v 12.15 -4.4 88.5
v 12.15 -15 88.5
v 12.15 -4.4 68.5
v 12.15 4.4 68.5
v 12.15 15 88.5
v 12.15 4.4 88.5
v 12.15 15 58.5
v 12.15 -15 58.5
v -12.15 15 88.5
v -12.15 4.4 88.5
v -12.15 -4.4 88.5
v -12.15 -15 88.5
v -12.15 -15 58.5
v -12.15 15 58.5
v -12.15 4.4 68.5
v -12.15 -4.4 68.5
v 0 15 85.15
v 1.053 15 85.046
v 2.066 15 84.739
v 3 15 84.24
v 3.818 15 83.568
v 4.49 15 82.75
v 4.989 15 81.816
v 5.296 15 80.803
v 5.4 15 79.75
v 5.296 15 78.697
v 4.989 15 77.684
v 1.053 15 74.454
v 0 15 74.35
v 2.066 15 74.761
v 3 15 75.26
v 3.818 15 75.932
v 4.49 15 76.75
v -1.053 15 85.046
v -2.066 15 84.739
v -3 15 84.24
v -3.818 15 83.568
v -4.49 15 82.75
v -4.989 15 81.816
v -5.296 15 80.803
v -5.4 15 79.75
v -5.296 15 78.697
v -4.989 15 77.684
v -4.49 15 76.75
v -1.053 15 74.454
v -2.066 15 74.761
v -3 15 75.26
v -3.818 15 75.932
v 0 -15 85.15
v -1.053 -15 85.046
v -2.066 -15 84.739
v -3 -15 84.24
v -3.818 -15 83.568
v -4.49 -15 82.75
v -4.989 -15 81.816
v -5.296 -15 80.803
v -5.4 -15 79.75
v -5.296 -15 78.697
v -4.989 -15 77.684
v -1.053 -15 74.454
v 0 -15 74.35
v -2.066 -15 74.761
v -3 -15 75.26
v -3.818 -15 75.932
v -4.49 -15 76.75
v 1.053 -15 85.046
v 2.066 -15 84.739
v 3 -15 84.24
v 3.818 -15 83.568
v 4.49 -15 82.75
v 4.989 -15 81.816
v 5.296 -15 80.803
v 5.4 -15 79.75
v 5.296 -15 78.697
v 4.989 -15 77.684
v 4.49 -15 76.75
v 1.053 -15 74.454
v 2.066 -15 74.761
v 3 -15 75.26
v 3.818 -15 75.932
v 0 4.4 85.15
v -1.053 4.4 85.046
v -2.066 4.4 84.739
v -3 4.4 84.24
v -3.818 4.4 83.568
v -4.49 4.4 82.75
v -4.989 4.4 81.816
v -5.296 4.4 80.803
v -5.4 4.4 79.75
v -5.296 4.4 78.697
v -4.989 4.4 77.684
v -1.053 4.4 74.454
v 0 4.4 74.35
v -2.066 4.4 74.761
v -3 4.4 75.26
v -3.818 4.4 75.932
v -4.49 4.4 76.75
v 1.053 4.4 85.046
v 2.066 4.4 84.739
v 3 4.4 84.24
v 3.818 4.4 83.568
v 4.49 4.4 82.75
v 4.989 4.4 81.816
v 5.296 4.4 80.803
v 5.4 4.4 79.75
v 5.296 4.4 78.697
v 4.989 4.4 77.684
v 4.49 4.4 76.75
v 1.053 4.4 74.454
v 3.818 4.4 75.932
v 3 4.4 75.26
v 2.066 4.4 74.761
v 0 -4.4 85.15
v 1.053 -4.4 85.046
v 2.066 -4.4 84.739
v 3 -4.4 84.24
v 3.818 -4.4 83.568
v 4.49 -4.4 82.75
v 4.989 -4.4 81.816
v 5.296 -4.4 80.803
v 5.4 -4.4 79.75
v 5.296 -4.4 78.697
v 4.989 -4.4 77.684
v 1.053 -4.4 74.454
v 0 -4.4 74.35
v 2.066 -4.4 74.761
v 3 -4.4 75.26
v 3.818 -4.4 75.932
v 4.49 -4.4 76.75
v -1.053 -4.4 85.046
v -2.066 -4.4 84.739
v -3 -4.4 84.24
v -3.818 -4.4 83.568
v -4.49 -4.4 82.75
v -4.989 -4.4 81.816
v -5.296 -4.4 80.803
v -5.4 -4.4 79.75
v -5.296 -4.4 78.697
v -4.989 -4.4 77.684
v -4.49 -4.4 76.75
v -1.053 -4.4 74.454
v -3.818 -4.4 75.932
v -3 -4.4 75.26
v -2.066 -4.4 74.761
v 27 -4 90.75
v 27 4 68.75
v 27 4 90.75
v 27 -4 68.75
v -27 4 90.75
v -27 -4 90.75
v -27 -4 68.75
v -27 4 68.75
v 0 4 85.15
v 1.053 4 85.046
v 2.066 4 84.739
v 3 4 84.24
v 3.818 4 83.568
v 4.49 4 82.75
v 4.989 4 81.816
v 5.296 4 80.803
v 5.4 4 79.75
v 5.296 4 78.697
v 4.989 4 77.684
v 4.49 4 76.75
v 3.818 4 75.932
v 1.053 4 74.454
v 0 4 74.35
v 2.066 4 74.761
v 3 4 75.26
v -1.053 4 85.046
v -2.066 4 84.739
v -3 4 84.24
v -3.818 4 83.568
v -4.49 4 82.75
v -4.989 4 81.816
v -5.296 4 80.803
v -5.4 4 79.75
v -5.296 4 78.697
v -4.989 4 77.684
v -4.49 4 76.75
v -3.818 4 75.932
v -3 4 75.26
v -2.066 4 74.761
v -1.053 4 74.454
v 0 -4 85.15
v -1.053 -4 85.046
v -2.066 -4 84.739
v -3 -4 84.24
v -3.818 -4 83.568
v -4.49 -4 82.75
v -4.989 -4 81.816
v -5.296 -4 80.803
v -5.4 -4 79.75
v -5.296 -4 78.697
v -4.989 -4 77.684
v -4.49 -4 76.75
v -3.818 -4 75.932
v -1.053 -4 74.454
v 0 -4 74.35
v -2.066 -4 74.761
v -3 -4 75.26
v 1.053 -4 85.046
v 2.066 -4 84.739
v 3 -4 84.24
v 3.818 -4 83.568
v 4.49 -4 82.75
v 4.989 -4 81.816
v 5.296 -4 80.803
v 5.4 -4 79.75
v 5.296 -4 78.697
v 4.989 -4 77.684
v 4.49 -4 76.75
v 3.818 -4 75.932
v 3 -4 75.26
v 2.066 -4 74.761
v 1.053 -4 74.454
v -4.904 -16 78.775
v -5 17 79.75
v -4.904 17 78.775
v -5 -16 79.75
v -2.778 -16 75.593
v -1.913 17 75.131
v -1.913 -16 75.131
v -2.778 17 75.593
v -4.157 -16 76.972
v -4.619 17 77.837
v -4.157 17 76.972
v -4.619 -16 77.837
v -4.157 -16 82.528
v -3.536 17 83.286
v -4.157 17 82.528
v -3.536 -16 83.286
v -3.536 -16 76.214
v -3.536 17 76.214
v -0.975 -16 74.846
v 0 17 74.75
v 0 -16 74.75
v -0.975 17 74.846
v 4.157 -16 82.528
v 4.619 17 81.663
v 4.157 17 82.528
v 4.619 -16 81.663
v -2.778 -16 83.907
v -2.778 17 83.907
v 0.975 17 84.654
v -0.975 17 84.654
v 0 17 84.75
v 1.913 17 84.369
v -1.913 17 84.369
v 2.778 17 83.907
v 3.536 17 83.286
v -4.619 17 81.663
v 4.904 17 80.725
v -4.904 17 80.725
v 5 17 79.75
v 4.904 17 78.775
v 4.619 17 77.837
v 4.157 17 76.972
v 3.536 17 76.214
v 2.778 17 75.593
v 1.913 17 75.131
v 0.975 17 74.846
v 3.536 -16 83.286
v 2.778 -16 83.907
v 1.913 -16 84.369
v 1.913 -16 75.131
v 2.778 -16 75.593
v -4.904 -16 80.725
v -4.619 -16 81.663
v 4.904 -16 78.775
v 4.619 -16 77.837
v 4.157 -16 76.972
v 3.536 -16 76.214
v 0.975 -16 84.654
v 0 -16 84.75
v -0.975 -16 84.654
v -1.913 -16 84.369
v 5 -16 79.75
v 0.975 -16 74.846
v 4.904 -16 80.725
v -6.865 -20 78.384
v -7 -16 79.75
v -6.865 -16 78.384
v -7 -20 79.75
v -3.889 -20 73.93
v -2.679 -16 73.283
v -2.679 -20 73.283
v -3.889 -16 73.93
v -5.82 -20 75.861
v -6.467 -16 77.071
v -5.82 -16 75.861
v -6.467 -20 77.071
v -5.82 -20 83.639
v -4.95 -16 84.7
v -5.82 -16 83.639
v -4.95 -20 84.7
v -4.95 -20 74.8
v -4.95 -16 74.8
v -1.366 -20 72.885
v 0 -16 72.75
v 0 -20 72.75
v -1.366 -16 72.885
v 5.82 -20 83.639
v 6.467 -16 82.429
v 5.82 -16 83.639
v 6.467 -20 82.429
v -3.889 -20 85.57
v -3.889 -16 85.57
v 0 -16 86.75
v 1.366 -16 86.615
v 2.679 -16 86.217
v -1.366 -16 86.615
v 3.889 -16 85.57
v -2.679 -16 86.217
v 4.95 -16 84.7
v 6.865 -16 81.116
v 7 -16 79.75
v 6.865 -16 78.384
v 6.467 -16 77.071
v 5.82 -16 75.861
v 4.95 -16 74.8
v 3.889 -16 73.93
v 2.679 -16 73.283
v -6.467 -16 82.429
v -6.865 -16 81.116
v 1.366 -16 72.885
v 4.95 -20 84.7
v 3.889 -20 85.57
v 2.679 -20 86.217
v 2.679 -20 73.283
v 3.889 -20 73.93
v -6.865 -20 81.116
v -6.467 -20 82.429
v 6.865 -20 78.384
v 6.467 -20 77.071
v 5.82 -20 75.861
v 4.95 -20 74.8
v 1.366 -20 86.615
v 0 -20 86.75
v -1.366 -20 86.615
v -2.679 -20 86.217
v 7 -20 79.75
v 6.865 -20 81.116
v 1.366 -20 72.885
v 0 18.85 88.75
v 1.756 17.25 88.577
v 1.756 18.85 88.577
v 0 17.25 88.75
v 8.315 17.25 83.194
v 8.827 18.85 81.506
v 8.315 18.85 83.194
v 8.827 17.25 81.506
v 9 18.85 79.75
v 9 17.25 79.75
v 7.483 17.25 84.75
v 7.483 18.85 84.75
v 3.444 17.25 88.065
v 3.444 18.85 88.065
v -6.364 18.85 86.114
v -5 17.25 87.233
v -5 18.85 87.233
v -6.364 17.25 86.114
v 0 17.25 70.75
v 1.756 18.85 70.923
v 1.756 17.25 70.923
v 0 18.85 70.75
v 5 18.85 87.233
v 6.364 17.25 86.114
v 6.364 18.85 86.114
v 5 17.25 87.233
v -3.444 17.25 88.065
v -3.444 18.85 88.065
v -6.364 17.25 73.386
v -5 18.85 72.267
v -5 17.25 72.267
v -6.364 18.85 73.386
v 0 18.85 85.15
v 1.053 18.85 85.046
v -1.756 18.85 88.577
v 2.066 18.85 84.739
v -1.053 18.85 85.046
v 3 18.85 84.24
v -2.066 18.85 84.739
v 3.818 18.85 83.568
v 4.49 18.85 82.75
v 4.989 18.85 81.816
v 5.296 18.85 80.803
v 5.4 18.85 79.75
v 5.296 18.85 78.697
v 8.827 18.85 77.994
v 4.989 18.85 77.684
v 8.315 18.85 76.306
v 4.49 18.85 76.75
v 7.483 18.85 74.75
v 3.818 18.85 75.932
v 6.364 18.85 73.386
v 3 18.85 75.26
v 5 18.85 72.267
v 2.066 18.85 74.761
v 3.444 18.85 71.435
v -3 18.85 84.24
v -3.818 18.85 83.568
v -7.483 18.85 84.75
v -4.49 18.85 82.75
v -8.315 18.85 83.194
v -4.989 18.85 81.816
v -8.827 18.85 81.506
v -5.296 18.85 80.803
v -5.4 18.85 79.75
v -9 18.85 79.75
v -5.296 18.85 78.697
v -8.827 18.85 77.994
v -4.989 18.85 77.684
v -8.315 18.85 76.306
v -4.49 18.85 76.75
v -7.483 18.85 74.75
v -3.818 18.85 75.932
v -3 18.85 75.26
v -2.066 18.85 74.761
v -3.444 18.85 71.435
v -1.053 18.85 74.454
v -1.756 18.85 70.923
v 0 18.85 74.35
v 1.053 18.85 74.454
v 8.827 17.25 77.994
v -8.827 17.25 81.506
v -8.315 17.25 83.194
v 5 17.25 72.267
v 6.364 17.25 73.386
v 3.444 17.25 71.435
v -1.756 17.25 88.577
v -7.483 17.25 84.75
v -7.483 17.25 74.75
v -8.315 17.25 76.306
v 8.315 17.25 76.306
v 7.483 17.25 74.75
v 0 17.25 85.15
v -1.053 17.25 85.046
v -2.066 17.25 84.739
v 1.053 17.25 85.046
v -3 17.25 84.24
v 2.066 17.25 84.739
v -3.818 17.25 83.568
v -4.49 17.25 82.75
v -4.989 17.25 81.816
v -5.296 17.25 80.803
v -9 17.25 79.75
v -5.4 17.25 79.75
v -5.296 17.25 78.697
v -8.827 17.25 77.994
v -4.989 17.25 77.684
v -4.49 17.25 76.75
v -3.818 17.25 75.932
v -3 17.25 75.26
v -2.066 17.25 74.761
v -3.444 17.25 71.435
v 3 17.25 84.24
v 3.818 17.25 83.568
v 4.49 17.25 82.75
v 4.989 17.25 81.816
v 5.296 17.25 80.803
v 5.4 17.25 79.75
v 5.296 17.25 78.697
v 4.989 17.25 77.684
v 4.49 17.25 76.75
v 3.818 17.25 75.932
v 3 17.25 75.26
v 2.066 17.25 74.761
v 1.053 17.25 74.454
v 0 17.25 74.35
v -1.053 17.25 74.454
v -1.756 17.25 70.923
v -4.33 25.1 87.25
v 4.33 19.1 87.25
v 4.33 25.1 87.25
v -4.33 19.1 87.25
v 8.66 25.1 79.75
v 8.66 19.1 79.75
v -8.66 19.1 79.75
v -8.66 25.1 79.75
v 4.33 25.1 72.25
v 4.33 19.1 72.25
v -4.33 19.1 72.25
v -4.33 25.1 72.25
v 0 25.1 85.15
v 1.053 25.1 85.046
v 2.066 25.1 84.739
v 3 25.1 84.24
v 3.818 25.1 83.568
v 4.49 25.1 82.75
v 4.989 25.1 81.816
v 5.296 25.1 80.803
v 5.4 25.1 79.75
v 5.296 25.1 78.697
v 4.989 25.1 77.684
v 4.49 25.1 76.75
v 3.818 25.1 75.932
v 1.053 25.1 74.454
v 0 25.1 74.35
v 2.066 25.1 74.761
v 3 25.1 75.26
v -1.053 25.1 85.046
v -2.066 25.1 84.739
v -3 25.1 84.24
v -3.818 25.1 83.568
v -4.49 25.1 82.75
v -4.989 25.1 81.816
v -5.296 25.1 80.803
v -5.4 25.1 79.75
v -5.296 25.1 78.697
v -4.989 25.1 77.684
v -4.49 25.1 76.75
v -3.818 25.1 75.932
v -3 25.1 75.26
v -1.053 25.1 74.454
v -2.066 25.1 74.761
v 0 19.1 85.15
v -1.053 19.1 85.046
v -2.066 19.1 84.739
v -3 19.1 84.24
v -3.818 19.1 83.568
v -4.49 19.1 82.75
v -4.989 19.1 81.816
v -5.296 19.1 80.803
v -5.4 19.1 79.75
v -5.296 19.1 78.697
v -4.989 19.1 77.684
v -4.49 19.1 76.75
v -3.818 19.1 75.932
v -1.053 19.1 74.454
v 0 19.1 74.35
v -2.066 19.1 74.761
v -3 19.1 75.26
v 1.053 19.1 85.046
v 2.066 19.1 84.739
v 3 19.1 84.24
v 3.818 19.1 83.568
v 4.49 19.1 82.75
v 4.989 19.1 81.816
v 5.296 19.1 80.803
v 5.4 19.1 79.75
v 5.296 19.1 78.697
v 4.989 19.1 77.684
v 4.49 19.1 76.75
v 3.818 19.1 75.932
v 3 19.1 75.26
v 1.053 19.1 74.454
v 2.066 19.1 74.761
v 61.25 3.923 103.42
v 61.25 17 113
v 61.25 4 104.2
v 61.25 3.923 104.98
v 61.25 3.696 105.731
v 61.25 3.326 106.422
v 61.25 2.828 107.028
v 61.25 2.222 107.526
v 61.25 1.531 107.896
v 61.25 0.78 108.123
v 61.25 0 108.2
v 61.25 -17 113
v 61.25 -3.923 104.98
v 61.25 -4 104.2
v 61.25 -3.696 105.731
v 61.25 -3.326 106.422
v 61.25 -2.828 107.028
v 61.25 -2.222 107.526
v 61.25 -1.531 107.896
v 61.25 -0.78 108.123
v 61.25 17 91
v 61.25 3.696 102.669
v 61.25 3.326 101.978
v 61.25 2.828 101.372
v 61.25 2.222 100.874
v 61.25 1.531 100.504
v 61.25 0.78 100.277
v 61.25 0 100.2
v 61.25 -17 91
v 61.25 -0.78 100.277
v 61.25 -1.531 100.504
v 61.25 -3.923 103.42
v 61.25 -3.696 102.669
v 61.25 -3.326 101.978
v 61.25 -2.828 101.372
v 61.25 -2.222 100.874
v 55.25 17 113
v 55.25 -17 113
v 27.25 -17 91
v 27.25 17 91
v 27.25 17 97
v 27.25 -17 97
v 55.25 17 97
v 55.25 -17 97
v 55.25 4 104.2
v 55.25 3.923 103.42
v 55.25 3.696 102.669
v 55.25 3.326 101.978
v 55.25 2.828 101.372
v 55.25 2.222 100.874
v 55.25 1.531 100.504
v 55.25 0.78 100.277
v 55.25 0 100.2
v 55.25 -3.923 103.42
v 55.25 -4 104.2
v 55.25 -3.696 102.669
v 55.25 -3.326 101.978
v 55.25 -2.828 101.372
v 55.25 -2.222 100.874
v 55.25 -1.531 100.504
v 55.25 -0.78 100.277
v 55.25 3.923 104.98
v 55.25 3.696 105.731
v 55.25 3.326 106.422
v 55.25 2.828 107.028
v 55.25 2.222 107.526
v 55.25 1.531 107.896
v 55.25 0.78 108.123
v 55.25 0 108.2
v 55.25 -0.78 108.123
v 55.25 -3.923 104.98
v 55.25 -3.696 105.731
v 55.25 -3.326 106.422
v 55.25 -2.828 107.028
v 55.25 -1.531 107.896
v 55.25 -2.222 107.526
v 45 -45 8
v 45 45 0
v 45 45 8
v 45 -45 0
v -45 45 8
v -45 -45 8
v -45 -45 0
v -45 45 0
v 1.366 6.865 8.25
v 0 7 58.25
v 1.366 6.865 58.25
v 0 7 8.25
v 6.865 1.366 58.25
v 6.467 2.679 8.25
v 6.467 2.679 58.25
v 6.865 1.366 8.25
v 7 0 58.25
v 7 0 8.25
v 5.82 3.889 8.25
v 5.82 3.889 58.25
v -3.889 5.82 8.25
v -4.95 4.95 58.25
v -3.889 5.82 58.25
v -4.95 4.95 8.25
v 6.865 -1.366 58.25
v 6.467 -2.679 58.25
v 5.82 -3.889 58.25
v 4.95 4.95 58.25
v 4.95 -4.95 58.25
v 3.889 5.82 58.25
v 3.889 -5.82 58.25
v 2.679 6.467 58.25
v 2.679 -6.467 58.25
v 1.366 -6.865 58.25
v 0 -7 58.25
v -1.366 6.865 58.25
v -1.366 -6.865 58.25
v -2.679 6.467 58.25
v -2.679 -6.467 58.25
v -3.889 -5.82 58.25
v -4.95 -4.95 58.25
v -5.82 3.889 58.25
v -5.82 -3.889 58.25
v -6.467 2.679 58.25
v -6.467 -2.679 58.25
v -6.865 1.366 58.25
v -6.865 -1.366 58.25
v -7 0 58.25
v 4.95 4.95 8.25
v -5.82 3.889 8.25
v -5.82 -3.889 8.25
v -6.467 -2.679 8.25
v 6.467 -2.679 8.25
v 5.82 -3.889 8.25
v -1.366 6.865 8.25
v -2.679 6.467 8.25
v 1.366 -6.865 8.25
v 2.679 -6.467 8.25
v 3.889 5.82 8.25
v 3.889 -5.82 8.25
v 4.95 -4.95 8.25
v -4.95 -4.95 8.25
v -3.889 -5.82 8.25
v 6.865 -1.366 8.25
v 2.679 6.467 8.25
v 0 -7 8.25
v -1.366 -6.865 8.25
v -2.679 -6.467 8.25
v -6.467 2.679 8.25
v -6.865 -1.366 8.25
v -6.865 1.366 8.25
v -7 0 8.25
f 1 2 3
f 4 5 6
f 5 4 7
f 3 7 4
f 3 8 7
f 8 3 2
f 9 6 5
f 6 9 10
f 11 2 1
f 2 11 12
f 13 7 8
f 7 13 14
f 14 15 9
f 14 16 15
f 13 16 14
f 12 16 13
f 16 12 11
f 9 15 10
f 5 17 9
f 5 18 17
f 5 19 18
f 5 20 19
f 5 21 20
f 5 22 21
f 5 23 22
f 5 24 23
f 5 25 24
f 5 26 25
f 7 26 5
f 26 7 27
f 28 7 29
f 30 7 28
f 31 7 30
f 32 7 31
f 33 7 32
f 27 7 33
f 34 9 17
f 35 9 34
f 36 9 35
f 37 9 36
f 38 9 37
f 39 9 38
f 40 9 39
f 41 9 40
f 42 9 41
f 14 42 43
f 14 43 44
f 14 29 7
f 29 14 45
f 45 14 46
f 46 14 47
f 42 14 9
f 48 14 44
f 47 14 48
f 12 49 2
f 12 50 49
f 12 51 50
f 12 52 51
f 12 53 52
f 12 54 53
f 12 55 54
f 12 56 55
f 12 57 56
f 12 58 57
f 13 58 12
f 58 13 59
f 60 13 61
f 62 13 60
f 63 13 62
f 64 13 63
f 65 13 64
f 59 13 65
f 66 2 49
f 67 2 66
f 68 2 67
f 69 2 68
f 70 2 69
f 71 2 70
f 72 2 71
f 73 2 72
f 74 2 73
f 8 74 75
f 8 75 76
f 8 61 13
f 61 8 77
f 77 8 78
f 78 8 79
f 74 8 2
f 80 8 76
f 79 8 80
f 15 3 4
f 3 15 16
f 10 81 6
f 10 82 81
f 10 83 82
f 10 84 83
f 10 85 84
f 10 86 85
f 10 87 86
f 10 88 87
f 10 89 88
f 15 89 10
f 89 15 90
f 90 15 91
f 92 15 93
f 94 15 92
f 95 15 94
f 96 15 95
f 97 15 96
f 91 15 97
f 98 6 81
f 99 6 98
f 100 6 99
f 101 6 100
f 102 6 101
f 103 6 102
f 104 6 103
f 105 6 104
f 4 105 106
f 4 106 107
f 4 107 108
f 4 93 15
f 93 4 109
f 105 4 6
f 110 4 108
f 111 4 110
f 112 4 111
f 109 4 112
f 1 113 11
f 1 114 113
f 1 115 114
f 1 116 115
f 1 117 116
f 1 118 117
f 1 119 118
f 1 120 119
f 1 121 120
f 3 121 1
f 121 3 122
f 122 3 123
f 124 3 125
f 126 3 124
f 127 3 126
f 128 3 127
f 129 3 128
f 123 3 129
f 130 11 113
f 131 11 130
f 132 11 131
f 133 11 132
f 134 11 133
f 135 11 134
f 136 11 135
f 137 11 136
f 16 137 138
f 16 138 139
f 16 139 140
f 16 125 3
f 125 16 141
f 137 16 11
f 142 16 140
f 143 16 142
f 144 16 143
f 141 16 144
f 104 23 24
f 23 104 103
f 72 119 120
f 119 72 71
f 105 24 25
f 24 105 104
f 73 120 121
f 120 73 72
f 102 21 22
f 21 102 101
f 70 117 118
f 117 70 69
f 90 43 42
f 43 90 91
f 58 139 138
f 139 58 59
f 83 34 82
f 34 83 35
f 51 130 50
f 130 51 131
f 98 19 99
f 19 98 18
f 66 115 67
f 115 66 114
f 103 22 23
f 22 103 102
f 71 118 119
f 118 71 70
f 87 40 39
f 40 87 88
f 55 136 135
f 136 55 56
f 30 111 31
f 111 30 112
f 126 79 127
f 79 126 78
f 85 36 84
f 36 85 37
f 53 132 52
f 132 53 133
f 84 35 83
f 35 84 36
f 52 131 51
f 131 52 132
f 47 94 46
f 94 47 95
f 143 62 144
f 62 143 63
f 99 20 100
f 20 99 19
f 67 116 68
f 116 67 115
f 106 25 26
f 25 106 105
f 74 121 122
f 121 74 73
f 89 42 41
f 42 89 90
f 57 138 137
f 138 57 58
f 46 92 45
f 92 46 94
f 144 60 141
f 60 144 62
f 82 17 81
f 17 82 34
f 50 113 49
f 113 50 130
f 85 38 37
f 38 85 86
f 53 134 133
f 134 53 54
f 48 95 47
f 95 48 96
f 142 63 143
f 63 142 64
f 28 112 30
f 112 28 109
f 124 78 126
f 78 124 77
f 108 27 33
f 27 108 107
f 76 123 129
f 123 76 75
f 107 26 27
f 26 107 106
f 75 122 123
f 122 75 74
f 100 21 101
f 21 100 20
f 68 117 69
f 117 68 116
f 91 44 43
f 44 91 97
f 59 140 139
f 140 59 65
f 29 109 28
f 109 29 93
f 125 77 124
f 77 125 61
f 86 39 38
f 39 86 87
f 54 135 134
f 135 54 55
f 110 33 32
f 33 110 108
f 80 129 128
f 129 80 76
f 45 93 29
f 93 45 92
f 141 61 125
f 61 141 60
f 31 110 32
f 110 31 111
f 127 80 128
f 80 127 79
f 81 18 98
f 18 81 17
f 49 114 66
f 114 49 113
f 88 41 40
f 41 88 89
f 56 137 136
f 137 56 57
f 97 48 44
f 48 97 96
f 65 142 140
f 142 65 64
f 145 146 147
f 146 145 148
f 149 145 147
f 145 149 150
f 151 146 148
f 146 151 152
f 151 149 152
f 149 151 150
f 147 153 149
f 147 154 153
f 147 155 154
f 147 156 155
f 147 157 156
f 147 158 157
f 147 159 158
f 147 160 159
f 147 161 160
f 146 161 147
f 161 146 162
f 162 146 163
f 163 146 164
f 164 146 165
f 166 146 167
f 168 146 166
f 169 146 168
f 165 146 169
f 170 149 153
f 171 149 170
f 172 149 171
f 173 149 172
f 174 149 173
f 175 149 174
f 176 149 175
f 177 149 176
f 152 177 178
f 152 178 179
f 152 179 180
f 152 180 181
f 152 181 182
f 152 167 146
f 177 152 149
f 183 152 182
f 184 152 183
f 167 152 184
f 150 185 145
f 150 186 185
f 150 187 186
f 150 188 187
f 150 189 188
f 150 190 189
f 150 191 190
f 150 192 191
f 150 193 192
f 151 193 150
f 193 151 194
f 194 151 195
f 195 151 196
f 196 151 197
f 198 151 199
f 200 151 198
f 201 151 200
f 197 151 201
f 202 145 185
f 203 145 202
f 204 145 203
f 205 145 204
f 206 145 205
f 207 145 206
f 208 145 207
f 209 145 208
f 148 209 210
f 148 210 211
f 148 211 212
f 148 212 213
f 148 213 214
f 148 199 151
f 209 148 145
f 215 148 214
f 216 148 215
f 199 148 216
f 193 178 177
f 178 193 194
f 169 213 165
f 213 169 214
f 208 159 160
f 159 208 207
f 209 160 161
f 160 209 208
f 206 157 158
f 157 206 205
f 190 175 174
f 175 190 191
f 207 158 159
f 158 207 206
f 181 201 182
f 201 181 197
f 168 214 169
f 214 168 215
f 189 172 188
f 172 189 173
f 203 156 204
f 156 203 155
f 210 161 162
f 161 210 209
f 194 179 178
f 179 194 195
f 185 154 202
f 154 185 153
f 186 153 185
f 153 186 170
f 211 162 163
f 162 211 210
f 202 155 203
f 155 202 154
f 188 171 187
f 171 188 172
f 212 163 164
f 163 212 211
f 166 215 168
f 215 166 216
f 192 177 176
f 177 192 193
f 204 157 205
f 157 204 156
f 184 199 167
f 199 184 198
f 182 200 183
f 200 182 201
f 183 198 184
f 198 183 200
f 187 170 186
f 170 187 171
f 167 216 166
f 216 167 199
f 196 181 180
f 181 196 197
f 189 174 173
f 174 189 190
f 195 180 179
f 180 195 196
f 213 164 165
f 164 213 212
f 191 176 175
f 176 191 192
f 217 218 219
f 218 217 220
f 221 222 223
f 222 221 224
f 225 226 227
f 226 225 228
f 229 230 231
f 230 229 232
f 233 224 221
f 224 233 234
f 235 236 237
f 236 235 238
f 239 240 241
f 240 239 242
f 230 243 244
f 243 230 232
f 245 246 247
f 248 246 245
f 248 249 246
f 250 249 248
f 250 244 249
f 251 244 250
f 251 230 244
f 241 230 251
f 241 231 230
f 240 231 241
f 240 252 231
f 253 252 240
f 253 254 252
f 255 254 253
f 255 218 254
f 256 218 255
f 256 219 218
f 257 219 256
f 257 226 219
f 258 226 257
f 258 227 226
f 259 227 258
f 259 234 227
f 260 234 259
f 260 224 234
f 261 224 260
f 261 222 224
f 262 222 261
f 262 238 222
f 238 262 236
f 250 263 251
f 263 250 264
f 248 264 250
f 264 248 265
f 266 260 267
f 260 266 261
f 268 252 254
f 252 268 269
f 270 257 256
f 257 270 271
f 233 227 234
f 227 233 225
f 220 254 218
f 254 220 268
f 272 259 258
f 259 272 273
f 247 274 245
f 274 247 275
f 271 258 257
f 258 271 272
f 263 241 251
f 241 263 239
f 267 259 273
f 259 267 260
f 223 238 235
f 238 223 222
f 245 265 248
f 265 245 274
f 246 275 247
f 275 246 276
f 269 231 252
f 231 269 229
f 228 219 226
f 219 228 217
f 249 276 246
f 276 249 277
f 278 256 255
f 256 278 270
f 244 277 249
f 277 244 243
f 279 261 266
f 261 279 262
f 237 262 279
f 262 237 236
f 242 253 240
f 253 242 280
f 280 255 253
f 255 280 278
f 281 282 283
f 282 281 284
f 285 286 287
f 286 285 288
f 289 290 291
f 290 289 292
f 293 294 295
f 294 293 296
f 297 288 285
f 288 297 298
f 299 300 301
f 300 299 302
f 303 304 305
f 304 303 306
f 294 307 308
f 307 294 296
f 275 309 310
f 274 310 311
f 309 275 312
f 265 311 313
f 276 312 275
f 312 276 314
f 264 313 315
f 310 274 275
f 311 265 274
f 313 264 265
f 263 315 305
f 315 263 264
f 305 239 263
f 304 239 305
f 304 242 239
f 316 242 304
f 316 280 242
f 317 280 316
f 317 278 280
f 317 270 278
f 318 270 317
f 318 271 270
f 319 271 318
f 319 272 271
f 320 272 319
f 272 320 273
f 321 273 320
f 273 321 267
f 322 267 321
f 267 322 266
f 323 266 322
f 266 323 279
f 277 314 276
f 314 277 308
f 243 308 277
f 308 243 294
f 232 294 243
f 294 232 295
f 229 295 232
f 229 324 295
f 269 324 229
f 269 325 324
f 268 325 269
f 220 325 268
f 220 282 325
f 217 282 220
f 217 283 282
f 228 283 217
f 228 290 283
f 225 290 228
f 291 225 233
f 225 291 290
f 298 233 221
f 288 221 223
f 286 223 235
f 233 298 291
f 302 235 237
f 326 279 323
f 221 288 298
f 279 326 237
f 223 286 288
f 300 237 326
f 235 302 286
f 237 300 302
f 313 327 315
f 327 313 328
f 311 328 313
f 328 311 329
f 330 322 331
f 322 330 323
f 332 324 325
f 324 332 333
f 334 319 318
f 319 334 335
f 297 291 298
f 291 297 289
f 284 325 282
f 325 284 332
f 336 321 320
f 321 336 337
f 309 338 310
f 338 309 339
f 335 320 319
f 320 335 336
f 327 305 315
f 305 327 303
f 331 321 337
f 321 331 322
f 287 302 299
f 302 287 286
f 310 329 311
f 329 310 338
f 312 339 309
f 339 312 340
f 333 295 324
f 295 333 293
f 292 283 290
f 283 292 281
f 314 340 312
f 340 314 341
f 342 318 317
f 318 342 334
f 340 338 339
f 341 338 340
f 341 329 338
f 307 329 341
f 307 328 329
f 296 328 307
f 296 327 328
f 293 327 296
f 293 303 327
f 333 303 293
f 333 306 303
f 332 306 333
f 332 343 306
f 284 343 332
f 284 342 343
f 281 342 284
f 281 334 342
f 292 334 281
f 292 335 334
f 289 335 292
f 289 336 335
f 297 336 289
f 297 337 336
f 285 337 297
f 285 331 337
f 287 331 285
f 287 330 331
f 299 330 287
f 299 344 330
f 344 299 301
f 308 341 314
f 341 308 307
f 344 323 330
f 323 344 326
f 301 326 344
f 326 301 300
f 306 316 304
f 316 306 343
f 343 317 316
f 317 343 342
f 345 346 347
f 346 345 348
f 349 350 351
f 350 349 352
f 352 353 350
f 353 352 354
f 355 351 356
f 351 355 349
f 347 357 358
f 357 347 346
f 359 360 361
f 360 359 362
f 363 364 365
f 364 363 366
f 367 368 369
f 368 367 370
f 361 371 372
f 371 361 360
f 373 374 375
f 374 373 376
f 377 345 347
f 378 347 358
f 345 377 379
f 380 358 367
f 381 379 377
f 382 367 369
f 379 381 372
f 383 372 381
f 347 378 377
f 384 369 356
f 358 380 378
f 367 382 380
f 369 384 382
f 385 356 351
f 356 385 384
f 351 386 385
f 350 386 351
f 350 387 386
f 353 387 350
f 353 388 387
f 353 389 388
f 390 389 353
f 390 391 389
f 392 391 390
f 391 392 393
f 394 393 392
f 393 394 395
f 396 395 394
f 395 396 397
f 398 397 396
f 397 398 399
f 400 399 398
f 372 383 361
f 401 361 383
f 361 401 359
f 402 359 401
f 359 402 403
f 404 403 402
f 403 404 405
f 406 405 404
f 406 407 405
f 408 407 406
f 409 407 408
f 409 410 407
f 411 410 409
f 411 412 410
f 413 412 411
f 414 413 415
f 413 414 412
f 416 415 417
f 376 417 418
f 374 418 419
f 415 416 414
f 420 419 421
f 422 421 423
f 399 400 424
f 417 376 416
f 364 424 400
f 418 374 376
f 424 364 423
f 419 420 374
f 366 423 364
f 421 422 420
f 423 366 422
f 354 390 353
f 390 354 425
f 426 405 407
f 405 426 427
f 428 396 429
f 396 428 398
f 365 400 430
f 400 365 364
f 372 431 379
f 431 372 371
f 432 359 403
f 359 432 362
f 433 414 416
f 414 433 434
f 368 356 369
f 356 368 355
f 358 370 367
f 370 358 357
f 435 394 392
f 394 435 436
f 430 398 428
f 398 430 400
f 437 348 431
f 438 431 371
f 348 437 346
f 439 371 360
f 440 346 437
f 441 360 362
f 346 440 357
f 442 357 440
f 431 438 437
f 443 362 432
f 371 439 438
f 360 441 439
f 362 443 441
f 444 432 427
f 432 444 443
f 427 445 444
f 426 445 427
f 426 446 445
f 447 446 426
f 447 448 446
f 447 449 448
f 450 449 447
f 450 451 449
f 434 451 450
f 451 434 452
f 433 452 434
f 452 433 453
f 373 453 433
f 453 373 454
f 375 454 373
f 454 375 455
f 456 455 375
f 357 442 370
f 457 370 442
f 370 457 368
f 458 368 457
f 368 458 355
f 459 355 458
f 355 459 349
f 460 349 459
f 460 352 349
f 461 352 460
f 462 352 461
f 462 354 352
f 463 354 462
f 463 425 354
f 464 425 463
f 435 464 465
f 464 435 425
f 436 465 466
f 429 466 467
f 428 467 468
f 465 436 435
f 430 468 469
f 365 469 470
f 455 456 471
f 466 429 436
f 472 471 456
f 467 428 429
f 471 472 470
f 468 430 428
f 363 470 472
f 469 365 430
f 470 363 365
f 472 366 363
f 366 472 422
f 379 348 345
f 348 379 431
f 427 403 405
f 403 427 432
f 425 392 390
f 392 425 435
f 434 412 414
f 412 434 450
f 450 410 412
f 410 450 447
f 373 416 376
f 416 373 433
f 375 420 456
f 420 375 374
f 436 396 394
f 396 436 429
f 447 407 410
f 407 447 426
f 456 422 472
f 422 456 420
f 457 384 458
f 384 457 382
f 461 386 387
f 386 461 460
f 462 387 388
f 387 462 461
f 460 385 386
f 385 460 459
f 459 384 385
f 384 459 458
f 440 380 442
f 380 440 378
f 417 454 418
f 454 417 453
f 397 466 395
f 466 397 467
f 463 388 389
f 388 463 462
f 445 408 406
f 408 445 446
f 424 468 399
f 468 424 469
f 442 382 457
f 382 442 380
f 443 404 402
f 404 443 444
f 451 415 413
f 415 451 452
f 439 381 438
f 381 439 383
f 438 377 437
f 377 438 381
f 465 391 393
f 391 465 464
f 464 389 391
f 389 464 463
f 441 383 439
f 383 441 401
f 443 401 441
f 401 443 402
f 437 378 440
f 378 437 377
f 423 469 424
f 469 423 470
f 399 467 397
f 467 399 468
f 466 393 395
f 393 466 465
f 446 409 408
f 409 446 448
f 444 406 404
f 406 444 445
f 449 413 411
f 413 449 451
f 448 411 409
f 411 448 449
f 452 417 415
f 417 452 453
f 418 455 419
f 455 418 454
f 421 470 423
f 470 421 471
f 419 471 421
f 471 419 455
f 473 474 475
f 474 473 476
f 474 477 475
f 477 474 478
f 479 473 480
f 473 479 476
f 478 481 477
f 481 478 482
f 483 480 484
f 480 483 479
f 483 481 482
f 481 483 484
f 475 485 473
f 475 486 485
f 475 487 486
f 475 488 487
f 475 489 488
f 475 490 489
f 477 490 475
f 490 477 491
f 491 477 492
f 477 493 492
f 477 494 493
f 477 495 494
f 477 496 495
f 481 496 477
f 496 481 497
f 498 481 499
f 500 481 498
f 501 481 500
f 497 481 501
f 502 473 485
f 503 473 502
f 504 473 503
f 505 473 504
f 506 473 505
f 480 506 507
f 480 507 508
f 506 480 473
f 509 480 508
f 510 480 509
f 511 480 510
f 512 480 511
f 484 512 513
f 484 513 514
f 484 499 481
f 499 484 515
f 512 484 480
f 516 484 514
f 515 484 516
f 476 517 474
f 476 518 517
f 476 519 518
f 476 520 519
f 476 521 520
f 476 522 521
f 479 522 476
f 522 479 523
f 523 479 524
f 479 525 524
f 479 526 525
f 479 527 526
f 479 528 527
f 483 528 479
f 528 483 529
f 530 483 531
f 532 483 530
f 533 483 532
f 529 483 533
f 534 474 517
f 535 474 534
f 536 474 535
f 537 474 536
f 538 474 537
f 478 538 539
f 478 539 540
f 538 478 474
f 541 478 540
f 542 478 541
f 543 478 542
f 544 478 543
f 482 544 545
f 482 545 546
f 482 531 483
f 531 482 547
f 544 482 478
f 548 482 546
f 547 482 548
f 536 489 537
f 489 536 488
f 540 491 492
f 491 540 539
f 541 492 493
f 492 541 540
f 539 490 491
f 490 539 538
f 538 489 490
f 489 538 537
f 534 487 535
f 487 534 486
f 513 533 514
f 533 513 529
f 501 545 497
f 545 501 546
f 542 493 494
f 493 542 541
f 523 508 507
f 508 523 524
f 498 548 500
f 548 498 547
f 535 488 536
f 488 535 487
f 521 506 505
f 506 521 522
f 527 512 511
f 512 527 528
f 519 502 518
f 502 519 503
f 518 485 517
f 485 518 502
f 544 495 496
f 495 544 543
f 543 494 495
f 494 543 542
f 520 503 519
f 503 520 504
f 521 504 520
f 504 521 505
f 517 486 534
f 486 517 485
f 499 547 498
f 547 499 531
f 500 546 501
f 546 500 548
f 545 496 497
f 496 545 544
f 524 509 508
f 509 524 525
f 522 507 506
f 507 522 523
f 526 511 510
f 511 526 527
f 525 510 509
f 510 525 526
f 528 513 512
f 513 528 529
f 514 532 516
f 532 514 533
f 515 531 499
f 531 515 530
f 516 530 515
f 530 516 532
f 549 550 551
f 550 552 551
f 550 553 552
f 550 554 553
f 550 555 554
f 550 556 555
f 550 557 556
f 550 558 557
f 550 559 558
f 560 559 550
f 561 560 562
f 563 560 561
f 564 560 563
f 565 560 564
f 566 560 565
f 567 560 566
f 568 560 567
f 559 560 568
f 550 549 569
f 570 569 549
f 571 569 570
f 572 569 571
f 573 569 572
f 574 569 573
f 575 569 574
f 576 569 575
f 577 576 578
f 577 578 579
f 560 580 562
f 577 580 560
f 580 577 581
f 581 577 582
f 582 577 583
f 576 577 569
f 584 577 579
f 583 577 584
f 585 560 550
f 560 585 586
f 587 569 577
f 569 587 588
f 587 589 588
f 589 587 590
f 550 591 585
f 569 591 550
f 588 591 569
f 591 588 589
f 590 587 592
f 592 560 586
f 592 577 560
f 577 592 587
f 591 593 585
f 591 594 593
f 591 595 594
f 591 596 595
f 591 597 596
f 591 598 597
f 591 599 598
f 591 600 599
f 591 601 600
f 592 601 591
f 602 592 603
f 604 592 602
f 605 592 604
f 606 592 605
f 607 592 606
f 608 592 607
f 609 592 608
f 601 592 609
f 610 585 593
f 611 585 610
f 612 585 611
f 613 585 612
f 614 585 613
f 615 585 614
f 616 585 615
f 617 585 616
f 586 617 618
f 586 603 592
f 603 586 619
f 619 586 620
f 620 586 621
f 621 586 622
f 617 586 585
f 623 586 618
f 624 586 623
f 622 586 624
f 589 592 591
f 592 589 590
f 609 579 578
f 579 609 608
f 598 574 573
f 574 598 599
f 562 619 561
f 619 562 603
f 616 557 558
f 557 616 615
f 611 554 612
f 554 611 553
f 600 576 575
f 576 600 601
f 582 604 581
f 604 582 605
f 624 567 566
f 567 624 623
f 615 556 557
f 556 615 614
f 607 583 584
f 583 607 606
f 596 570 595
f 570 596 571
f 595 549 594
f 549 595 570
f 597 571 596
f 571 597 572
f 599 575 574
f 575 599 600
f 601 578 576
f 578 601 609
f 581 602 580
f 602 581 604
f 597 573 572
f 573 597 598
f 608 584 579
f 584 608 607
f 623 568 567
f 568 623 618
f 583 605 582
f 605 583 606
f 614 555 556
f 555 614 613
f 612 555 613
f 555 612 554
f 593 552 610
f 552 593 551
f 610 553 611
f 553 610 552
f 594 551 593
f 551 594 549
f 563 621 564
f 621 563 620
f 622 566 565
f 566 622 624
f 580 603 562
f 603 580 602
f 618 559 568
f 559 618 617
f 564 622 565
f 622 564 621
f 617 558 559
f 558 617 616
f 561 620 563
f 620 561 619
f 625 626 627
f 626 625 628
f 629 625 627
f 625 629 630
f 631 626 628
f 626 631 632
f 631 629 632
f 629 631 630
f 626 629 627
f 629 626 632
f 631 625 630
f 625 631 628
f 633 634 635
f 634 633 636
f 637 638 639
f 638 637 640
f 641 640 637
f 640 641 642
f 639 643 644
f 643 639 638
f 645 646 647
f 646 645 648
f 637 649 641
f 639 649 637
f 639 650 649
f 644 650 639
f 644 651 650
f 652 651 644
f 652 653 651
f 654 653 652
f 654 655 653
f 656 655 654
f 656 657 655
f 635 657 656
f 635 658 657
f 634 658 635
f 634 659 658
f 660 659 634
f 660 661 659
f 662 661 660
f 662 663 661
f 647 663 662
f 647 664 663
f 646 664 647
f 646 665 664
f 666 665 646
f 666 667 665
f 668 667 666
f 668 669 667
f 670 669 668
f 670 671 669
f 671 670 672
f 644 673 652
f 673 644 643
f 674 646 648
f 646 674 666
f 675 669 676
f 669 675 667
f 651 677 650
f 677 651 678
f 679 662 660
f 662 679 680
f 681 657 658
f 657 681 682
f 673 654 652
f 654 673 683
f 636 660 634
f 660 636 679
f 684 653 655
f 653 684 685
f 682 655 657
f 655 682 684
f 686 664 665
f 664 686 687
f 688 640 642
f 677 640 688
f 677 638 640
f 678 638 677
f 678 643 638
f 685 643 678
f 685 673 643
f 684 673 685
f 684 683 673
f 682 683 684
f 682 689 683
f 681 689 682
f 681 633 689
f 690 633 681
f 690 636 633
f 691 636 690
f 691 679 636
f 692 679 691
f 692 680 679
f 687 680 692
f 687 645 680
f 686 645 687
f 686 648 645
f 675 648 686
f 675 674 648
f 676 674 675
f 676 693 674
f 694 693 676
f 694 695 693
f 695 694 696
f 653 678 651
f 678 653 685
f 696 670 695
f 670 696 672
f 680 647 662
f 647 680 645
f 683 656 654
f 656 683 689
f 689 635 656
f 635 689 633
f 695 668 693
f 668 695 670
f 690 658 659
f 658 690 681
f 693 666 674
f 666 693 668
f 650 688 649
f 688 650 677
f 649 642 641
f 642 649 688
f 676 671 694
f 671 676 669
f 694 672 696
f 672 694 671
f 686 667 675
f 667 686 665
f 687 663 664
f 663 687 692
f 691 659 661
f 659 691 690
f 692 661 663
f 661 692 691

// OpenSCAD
$fn = 32;

// ------------------------------------------------------------------------
// Lamp arm: column d14 x 50 mm, arm 54 mm
// Every part is its own module, assembly() places every instance.
// ------------------------------------------------------------------------

// --- part 1 ---
module lamp_base() {
  difference() {
    translate([-45, -45, 0]) cube([90, 90, 8]);
  }
}

// --- part 2 ---
module lamp_column() {
  cylinder(h = 50, d = 14);
}

// --- part 3 ---
module head_fork() {
  difference() {
    translate([-12.15, -15, 0]) cube([24.3, 30, 30]);
    translate([-13.15, -4.4, 10]) cube([26.3, 8.8, 21]);
    translate([0, 0, 21.25]) rotate([90, 0, 0]) cylinder(h = 32, d = 10.8, center = true);
  }
}

// --- part 4 ---
module lamp_arm() {
  difference() {
    translate([-27, -4, 0]) cube([54, 8, 22]);
    translate([0, 0, 11]) rotate([90, 0, 0]) cylinder(h = 10, d = 10.8, center = true);
  }
}

// --- part 5 ---
module arm_pin() {
  rotate([0, 90, 0]) cylinder(h = 34, d = 10, center = true);
  translate([-20, 0, 0]) rotate([0, 90, 0]) cylinder(h = 4, d = 14);
}

// --- part 6 ---
module arm_washer() {
  difference() {
      translate([0, 0, 0]) cylinder(h = 1.6, d = 18);
      translate([0, 0, -1]) cylinder(h = 3.6, d = 10.8);
    }
}

// --- part 7 ---
module arm_nut() {
  difference() {
    linear_extrude(height = 6) polygon(points = [[8.66, 0], [4.33, 7.5], [-4.33, 7.5], [-8.66, 0], [-4.33, -7.5], [4.33, -7.5]]);
    translate([0, 0, -1]) cylinder(h = 8, d = 10.8);
  }
}

// --- part 8 ---
module shade_bracket() {
  difference() {
    translate([-17, -17, 0]) cube([34, 34, 22]);
    translate([-18, -18, 6]) cube([29, 36, 17]);
    translate([14, 0, 13.2]) rotate([0, 90, 0]) cylinder(h = 8, d = 8, center = true);
  }
}

// --- assembly ---
module assembly() {
  color([0.80, 0.24, 0.20]) translate([0, 0, 0]) rotate([0, 0, 0]) lamp_base();
  color([0.20, 0.45, 0.75]) translate([0, 0, 8.25]) rotate([0, 0, 0]) lamp_column();
  color([0.25, 0.62, 0.32]) translate([0, 0, 58.5]) rotate([0, 0, 0]) head_fork();
  color([0.92, 0.70, 0.18]) translate([0, 0, 68.75]) rotate([0, 0, 0]) lamp_arm();
  color([0.58, 0.35, 0.70]) translate([0, 0, 79.75]) rotate([0, 0, 90]) arm_pin();
  color([0.16, 0.66, 0.66]) translate([0, 18.85, 79.75]) rotate([90, 0, 0]) arm_washer();
  color([0.85, 0.48, 0.18]) translate([0, 25.1, 79.75]) rotate([90, 0, 0]) arm_nut();
  color([0.55, 0.60, 0.65]) translate([44.25, 0, 91]) rotate([0, 0, 0]) shade_bracket();
}

assembly();
